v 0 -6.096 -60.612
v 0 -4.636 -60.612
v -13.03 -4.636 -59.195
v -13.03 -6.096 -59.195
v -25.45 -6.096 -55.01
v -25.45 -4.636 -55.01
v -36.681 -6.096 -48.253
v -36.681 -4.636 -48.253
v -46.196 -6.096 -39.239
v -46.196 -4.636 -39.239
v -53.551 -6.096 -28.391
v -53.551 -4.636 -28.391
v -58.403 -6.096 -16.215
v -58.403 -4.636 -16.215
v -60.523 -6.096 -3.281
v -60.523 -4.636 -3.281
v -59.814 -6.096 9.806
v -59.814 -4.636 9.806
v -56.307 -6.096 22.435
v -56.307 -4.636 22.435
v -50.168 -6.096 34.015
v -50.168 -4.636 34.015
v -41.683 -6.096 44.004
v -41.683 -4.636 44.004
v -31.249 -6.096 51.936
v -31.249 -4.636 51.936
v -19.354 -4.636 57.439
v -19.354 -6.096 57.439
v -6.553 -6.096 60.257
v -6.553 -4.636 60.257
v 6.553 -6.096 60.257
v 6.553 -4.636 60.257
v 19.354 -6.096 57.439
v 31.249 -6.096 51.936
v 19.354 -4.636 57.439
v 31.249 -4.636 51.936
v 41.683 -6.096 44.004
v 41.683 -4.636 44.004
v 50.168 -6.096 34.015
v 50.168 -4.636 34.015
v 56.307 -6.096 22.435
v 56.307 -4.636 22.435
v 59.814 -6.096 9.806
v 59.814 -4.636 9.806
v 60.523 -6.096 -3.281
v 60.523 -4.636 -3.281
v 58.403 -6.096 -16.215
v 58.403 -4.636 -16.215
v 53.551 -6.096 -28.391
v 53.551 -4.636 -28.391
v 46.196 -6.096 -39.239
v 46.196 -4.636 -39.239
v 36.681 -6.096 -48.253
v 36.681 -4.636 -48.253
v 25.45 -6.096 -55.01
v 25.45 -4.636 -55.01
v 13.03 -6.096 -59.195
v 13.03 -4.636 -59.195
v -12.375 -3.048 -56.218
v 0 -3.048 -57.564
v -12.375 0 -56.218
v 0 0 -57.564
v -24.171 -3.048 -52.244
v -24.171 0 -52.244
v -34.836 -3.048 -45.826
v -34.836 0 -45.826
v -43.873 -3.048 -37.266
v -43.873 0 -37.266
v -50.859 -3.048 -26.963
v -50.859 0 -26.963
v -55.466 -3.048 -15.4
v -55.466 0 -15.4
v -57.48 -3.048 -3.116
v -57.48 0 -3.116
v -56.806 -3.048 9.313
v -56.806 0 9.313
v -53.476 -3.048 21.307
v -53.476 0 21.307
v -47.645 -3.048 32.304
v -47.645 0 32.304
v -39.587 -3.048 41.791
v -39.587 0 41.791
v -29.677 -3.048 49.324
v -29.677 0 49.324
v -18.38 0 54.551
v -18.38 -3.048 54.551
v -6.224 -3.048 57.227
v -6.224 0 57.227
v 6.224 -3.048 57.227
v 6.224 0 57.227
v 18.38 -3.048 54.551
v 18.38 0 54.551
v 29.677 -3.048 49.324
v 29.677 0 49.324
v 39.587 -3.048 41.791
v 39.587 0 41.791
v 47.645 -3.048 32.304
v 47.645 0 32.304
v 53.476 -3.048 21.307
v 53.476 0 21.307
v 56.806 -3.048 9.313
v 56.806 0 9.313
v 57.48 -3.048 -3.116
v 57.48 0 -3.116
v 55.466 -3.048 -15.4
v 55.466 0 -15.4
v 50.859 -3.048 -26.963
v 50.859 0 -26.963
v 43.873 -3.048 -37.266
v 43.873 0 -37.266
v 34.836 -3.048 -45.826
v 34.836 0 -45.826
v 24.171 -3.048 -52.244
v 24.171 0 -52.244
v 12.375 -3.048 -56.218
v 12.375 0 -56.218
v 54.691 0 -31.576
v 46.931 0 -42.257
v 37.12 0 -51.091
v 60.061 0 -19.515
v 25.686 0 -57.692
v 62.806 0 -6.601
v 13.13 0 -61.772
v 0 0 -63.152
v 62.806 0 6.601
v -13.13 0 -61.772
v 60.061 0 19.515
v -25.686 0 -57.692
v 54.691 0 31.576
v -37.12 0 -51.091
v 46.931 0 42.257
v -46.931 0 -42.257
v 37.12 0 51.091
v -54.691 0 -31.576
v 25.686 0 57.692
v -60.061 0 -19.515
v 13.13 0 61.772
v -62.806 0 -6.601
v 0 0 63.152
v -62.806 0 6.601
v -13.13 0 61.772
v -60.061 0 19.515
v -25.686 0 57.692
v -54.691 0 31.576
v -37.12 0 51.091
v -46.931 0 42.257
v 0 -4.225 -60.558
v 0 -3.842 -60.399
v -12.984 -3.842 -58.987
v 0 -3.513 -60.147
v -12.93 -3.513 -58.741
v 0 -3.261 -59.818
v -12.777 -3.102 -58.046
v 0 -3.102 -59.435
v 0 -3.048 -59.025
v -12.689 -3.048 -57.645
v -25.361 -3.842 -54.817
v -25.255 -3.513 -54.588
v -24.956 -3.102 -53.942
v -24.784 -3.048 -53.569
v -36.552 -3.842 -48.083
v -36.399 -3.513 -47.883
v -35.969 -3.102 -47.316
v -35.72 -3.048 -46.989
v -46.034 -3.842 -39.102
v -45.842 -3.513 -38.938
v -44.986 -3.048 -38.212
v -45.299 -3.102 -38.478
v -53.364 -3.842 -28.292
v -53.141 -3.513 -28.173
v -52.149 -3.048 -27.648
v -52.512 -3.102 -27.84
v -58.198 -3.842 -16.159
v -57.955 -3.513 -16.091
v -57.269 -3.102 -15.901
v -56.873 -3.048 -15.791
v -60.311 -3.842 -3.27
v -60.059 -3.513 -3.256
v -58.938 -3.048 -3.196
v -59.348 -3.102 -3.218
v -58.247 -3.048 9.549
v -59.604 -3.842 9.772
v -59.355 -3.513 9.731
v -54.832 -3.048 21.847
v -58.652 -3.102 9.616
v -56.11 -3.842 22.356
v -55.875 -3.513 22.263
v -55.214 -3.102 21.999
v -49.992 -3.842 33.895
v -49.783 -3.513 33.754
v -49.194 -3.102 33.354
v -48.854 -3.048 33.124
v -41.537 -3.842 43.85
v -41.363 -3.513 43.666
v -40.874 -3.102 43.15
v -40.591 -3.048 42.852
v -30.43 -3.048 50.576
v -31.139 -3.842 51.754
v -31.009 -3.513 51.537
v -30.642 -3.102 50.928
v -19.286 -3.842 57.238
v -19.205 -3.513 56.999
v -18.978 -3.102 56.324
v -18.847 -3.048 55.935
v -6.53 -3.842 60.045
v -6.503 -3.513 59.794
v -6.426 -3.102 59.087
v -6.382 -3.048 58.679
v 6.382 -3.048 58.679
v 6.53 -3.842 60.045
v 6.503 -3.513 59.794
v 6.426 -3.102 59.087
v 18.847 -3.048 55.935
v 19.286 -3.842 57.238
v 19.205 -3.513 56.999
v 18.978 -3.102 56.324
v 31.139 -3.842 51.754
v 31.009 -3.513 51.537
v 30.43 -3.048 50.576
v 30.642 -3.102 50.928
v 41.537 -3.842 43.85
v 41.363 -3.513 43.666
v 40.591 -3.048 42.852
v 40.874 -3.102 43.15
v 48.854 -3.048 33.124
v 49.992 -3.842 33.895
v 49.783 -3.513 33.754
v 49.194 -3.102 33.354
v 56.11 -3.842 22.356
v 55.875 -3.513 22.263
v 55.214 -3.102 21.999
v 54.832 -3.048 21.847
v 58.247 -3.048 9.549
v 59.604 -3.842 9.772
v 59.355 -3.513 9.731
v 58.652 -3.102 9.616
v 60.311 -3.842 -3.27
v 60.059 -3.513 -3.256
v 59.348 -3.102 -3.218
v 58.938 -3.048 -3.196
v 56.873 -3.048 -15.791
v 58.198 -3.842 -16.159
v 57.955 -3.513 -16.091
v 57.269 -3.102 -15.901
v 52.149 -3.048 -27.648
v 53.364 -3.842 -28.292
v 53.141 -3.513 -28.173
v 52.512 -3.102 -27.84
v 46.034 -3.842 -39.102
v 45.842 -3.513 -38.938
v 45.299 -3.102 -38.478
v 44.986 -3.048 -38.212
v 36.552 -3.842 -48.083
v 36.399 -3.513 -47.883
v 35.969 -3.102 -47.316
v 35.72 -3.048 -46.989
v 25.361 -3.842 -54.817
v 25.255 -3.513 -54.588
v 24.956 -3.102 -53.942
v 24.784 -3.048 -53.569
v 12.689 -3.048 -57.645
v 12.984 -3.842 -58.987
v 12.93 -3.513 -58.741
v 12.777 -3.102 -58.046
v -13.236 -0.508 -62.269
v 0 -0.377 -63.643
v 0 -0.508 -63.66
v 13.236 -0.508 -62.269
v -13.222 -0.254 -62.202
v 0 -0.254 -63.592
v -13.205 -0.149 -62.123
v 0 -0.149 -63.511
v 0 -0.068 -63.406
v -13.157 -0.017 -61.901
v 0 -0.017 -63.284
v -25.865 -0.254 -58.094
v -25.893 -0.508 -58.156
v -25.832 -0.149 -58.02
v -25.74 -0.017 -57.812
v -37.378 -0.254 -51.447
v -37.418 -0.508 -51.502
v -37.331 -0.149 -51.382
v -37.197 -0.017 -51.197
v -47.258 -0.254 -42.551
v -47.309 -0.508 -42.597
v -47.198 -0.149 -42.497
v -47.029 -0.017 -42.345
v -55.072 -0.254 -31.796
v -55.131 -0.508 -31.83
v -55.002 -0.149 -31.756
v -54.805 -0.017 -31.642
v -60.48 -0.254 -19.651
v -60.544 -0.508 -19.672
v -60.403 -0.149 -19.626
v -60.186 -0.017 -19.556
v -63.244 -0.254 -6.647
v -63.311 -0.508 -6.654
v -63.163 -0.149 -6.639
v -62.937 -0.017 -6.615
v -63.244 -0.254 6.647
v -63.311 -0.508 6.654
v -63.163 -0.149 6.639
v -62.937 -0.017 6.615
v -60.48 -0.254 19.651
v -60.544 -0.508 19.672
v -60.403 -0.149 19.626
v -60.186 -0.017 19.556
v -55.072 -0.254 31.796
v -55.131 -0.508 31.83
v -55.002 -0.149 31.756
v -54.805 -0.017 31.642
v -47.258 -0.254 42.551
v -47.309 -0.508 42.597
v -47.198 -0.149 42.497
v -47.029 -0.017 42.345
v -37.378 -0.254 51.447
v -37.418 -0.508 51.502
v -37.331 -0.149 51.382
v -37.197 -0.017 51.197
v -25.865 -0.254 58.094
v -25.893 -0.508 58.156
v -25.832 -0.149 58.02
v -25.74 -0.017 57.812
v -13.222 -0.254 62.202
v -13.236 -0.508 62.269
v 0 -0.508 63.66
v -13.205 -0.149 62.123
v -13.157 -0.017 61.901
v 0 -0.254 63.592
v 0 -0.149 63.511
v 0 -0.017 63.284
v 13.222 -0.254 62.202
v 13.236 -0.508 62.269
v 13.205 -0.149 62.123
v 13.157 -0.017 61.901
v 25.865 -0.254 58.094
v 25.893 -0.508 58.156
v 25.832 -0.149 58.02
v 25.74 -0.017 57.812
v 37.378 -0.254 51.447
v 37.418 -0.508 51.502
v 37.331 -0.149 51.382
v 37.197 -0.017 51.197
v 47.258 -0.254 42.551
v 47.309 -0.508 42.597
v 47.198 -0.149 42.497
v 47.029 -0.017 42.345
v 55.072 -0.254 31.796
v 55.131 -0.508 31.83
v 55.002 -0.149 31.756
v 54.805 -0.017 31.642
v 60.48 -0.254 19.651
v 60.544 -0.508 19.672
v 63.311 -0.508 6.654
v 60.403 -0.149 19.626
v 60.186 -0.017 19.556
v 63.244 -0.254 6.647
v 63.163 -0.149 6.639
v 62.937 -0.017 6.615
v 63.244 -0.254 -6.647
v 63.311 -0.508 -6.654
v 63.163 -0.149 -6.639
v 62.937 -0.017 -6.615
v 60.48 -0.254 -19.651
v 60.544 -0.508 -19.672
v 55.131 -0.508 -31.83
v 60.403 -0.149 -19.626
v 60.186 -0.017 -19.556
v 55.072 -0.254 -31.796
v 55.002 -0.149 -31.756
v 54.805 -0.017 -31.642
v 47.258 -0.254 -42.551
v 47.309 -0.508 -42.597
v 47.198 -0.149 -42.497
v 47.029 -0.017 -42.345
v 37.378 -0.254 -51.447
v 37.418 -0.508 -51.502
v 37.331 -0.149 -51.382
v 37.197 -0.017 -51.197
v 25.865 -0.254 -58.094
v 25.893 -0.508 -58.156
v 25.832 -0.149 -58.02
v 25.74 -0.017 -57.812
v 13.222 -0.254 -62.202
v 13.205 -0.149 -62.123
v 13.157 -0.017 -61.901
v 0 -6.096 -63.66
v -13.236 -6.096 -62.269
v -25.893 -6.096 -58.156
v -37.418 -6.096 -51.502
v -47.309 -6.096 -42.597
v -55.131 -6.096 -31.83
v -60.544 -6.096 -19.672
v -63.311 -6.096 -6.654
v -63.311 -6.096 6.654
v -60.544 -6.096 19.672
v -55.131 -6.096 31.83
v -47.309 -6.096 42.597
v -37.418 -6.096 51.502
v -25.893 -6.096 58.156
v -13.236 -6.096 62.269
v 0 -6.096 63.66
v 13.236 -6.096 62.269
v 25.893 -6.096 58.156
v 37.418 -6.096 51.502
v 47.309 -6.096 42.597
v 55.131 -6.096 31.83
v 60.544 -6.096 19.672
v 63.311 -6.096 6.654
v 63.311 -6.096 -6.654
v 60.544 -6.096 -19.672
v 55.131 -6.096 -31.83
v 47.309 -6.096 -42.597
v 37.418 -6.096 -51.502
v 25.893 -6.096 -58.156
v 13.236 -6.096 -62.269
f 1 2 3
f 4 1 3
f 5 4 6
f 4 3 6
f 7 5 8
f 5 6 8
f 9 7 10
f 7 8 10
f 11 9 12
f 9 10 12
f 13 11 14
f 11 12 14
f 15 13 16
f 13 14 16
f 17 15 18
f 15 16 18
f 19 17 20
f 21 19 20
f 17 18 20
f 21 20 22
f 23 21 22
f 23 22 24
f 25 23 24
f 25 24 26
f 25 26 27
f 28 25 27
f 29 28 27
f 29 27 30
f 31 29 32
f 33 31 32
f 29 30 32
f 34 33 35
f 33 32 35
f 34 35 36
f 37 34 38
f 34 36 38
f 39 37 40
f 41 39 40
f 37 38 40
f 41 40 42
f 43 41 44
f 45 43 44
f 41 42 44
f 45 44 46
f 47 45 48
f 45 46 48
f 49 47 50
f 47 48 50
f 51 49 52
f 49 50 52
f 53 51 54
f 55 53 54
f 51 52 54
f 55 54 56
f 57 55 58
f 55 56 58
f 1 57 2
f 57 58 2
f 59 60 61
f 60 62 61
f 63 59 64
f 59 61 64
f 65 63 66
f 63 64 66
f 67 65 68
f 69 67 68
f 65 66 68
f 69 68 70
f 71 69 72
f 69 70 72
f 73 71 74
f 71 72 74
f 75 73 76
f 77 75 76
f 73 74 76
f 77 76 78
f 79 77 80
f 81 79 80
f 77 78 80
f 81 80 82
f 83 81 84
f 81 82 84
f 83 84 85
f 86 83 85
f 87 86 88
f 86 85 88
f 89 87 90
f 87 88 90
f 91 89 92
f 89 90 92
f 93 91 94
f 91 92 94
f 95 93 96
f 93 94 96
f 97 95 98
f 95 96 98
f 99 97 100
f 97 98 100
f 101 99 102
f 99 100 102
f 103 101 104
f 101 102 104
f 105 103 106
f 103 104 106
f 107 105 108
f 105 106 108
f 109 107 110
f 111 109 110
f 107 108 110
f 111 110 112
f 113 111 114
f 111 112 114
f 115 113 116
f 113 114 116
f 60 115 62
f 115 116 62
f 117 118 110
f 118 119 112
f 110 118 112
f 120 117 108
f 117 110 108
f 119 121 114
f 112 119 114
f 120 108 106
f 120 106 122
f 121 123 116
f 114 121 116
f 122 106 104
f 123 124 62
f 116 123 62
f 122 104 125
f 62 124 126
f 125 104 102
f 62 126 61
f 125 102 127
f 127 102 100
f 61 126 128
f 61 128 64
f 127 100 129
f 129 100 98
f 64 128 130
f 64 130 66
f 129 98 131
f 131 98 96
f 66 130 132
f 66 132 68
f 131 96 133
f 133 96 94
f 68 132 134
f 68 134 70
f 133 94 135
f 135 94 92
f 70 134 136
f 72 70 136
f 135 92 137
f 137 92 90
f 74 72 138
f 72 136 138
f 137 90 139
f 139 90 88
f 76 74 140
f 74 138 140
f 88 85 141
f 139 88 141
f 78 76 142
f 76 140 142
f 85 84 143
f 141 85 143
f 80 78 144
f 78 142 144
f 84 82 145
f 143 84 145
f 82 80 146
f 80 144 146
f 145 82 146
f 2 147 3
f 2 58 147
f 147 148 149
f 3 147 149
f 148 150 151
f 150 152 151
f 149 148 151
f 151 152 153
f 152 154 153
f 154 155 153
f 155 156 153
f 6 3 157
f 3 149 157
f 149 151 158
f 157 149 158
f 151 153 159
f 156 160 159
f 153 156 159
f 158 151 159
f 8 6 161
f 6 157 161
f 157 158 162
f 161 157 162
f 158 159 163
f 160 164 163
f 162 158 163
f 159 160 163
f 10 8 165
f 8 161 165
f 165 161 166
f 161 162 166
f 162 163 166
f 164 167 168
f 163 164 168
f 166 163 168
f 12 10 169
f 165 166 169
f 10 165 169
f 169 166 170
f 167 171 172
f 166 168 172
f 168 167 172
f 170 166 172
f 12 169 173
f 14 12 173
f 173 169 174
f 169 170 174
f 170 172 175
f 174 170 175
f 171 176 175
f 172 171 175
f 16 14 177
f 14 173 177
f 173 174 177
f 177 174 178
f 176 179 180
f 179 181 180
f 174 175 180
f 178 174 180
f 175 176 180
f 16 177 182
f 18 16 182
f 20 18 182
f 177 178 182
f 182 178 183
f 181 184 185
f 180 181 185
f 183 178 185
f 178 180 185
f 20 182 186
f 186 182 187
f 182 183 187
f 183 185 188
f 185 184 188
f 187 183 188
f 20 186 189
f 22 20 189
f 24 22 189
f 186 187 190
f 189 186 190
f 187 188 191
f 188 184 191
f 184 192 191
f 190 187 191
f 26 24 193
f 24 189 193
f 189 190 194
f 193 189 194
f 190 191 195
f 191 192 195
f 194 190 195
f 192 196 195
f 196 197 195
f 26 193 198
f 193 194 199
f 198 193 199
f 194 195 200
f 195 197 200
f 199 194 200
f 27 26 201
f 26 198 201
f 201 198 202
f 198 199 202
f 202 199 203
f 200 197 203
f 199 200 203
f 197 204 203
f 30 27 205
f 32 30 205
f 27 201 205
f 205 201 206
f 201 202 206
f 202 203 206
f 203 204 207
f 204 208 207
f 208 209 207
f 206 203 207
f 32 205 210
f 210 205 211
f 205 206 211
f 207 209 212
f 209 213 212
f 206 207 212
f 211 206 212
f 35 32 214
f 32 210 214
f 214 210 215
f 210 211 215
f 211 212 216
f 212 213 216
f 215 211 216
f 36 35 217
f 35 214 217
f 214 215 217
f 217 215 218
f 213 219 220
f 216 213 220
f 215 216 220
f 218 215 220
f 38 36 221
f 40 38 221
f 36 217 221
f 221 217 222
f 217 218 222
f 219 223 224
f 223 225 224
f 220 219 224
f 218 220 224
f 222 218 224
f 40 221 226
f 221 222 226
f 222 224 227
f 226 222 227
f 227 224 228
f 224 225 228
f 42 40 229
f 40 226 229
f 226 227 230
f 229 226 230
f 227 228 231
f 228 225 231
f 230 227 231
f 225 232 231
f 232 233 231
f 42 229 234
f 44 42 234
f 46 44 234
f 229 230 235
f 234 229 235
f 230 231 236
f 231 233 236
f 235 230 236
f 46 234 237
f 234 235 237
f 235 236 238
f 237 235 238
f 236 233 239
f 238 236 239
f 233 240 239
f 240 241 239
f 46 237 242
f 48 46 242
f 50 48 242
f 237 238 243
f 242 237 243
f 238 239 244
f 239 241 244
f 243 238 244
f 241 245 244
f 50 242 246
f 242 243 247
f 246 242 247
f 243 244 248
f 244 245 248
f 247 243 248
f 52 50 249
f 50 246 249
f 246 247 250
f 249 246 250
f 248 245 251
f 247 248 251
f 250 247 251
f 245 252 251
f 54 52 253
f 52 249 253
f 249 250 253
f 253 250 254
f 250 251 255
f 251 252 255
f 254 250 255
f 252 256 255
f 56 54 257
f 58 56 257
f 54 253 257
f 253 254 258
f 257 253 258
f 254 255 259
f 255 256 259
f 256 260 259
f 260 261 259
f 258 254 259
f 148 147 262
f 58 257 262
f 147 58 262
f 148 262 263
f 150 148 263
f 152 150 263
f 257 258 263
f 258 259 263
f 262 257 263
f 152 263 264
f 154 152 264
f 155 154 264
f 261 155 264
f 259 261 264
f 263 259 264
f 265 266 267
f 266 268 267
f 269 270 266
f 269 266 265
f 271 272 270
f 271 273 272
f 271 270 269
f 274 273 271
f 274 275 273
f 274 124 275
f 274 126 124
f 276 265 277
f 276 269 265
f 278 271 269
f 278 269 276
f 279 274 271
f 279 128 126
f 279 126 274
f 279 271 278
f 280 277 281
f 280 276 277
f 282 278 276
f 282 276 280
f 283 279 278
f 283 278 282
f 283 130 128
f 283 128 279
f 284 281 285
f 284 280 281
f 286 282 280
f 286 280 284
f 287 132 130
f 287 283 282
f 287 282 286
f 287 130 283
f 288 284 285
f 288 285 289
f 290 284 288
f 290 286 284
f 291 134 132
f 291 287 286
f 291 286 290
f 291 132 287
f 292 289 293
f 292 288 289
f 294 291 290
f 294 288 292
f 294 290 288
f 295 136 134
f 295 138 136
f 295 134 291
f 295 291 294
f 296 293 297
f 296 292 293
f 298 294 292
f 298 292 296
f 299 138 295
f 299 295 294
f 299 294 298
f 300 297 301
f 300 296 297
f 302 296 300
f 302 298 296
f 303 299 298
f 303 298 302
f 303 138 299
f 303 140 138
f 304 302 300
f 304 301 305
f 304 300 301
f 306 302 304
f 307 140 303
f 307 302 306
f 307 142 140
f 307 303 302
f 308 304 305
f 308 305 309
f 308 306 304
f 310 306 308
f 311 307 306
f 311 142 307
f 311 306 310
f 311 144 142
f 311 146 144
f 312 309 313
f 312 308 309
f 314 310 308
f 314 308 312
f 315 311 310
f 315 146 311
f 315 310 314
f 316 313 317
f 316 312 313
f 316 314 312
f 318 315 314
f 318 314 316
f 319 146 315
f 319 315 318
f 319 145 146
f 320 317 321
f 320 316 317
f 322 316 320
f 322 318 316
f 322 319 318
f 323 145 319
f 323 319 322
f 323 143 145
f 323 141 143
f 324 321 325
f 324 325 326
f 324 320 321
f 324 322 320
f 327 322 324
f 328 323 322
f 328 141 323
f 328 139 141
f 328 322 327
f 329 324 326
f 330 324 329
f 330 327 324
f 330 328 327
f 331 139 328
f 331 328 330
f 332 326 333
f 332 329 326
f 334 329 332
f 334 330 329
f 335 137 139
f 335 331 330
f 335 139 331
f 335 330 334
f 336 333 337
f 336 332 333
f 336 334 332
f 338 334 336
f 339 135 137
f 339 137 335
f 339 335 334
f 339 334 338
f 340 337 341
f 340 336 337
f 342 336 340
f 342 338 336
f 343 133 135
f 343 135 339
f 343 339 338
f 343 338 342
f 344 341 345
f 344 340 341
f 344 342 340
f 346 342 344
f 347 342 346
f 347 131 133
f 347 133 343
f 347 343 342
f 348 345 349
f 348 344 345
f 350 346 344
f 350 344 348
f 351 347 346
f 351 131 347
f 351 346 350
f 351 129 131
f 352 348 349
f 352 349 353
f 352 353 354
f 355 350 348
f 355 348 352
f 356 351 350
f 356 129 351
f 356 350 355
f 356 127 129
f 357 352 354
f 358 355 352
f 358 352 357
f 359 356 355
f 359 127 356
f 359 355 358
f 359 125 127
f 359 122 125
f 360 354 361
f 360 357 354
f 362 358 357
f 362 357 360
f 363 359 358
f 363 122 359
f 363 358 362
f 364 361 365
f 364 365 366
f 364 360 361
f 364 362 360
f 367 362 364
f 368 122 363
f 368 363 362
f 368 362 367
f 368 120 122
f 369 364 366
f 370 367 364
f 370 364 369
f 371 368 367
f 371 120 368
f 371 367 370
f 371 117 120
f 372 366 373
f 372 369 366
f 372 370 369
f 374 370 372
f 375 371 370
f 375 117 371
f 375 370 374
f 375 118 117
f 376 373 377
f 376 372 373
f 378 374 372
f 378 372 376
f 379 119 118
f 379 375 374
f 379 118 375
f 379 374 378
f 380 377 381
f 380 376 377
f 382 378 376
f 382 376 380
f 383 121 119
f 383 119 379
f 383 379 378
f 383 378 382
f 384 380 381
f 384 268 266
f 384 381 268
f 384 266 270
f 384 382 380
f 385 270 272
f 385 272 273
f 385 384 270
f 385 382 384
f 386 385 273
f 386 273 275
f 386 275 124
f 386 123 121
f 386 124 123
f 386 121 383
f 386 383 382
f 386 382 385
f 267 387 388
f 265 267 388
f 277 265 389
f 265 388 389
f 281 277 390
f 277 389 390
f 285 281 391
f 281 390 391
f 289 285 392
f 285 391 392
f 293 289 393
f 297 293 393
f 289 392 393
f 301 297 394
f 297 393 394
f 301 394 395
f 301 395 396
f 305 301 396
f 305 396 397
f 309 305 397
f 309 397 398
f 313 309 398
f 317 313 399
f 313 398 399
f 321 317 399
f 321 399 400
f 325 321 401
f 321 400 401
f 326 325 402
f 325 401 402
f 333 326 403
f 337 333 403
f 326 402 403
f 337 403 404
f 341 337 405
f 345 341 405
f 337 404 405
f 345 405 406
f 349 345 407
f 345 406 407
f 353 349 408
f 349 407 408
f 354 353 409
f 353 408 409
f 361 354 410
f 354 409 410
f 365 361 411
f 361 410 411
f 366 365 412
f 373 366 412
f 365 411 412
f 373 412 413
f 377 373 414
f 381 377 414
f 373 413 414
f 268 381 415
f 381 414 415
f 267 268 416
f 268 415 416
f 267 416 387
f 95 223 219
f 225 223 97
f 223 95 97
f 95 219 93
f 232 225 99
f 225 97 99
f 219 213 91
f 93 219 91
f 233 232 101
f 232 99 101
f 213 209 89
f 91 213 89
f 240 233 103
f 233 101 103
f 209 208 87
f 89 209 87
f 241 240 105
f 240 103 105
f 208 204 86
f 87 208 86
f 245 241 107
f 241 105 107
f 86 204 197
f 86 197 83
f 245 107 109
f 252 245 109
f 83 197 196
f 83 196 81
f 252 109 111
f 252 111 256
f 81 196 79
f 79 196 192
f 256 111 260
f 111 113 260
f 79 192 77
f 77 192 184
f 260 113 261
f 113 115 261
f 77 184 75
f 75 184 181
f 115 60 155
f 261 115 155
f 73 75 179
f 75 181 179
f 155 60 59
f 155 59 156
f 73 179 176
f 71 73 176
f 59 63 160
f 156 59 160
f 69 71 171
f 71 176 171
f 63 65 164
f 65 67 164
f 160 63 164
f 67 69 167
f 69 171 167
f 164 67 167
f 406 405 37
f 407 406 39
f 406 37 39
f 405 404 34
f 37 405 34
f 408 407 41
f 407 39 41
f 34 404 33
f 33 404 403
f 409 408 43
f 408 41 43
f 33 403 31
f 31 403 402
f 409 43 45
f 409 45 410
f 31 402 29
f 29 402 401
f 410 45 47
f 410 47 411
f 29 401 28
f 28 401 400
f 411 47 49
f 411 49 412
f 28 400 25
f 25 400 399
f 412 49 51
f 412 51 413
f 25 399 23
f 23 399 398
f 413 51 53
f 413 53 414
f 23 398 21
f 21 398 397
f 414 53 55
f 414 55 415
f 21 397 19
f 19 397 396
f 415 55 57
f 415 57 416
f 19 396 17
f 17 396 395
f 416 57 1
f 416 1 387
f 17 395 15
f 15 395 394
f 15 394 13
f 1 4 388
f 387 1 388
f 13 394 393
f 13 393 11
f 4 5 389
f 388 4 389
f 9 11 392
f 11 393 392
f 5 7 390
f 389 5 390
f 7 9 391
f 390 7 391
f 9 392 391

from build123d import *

# Parameters (mm, degrees)
FILLET1_R = 1.5875
FILLET2_R = 0.508


with BuildPart() as part:
    # Sketch1 → Revolve1 (revolve)
    with BuildSketch(Plane.XY, mode=Mode.PRIVATE) as revolve1_sk:
        Polygon((-57.56402, 0), (-63.66002, 0), (-63.66002, -6.096), (-60.61202, -6.096), (-60.61202, -3.048), (-57.56402, -3.048), align=None)
    revolve(revolve1_sk.sketch.rotate(Axis((0, 0, 0), (0, 1, 0)), 270), axis=Axis((0, 0, 0), (0, 1, 0)))

    # Fillet1
    fillet1_edges = [part.edges().sort_by_distance(p)[0] for p in [
        (0, -3.048, 60.61202),
    ]]
    fillet(fillet1_edges, radius=FILLET1_R)

    # Fillet2
    fillet2_edges = [part.edges().sort_by_distance(p)[0] for p in [
        (0, 0, 63.66002),
    ]]
    fillet(fillet2_edges, radius=FILLET2_R)


solid = part.part
